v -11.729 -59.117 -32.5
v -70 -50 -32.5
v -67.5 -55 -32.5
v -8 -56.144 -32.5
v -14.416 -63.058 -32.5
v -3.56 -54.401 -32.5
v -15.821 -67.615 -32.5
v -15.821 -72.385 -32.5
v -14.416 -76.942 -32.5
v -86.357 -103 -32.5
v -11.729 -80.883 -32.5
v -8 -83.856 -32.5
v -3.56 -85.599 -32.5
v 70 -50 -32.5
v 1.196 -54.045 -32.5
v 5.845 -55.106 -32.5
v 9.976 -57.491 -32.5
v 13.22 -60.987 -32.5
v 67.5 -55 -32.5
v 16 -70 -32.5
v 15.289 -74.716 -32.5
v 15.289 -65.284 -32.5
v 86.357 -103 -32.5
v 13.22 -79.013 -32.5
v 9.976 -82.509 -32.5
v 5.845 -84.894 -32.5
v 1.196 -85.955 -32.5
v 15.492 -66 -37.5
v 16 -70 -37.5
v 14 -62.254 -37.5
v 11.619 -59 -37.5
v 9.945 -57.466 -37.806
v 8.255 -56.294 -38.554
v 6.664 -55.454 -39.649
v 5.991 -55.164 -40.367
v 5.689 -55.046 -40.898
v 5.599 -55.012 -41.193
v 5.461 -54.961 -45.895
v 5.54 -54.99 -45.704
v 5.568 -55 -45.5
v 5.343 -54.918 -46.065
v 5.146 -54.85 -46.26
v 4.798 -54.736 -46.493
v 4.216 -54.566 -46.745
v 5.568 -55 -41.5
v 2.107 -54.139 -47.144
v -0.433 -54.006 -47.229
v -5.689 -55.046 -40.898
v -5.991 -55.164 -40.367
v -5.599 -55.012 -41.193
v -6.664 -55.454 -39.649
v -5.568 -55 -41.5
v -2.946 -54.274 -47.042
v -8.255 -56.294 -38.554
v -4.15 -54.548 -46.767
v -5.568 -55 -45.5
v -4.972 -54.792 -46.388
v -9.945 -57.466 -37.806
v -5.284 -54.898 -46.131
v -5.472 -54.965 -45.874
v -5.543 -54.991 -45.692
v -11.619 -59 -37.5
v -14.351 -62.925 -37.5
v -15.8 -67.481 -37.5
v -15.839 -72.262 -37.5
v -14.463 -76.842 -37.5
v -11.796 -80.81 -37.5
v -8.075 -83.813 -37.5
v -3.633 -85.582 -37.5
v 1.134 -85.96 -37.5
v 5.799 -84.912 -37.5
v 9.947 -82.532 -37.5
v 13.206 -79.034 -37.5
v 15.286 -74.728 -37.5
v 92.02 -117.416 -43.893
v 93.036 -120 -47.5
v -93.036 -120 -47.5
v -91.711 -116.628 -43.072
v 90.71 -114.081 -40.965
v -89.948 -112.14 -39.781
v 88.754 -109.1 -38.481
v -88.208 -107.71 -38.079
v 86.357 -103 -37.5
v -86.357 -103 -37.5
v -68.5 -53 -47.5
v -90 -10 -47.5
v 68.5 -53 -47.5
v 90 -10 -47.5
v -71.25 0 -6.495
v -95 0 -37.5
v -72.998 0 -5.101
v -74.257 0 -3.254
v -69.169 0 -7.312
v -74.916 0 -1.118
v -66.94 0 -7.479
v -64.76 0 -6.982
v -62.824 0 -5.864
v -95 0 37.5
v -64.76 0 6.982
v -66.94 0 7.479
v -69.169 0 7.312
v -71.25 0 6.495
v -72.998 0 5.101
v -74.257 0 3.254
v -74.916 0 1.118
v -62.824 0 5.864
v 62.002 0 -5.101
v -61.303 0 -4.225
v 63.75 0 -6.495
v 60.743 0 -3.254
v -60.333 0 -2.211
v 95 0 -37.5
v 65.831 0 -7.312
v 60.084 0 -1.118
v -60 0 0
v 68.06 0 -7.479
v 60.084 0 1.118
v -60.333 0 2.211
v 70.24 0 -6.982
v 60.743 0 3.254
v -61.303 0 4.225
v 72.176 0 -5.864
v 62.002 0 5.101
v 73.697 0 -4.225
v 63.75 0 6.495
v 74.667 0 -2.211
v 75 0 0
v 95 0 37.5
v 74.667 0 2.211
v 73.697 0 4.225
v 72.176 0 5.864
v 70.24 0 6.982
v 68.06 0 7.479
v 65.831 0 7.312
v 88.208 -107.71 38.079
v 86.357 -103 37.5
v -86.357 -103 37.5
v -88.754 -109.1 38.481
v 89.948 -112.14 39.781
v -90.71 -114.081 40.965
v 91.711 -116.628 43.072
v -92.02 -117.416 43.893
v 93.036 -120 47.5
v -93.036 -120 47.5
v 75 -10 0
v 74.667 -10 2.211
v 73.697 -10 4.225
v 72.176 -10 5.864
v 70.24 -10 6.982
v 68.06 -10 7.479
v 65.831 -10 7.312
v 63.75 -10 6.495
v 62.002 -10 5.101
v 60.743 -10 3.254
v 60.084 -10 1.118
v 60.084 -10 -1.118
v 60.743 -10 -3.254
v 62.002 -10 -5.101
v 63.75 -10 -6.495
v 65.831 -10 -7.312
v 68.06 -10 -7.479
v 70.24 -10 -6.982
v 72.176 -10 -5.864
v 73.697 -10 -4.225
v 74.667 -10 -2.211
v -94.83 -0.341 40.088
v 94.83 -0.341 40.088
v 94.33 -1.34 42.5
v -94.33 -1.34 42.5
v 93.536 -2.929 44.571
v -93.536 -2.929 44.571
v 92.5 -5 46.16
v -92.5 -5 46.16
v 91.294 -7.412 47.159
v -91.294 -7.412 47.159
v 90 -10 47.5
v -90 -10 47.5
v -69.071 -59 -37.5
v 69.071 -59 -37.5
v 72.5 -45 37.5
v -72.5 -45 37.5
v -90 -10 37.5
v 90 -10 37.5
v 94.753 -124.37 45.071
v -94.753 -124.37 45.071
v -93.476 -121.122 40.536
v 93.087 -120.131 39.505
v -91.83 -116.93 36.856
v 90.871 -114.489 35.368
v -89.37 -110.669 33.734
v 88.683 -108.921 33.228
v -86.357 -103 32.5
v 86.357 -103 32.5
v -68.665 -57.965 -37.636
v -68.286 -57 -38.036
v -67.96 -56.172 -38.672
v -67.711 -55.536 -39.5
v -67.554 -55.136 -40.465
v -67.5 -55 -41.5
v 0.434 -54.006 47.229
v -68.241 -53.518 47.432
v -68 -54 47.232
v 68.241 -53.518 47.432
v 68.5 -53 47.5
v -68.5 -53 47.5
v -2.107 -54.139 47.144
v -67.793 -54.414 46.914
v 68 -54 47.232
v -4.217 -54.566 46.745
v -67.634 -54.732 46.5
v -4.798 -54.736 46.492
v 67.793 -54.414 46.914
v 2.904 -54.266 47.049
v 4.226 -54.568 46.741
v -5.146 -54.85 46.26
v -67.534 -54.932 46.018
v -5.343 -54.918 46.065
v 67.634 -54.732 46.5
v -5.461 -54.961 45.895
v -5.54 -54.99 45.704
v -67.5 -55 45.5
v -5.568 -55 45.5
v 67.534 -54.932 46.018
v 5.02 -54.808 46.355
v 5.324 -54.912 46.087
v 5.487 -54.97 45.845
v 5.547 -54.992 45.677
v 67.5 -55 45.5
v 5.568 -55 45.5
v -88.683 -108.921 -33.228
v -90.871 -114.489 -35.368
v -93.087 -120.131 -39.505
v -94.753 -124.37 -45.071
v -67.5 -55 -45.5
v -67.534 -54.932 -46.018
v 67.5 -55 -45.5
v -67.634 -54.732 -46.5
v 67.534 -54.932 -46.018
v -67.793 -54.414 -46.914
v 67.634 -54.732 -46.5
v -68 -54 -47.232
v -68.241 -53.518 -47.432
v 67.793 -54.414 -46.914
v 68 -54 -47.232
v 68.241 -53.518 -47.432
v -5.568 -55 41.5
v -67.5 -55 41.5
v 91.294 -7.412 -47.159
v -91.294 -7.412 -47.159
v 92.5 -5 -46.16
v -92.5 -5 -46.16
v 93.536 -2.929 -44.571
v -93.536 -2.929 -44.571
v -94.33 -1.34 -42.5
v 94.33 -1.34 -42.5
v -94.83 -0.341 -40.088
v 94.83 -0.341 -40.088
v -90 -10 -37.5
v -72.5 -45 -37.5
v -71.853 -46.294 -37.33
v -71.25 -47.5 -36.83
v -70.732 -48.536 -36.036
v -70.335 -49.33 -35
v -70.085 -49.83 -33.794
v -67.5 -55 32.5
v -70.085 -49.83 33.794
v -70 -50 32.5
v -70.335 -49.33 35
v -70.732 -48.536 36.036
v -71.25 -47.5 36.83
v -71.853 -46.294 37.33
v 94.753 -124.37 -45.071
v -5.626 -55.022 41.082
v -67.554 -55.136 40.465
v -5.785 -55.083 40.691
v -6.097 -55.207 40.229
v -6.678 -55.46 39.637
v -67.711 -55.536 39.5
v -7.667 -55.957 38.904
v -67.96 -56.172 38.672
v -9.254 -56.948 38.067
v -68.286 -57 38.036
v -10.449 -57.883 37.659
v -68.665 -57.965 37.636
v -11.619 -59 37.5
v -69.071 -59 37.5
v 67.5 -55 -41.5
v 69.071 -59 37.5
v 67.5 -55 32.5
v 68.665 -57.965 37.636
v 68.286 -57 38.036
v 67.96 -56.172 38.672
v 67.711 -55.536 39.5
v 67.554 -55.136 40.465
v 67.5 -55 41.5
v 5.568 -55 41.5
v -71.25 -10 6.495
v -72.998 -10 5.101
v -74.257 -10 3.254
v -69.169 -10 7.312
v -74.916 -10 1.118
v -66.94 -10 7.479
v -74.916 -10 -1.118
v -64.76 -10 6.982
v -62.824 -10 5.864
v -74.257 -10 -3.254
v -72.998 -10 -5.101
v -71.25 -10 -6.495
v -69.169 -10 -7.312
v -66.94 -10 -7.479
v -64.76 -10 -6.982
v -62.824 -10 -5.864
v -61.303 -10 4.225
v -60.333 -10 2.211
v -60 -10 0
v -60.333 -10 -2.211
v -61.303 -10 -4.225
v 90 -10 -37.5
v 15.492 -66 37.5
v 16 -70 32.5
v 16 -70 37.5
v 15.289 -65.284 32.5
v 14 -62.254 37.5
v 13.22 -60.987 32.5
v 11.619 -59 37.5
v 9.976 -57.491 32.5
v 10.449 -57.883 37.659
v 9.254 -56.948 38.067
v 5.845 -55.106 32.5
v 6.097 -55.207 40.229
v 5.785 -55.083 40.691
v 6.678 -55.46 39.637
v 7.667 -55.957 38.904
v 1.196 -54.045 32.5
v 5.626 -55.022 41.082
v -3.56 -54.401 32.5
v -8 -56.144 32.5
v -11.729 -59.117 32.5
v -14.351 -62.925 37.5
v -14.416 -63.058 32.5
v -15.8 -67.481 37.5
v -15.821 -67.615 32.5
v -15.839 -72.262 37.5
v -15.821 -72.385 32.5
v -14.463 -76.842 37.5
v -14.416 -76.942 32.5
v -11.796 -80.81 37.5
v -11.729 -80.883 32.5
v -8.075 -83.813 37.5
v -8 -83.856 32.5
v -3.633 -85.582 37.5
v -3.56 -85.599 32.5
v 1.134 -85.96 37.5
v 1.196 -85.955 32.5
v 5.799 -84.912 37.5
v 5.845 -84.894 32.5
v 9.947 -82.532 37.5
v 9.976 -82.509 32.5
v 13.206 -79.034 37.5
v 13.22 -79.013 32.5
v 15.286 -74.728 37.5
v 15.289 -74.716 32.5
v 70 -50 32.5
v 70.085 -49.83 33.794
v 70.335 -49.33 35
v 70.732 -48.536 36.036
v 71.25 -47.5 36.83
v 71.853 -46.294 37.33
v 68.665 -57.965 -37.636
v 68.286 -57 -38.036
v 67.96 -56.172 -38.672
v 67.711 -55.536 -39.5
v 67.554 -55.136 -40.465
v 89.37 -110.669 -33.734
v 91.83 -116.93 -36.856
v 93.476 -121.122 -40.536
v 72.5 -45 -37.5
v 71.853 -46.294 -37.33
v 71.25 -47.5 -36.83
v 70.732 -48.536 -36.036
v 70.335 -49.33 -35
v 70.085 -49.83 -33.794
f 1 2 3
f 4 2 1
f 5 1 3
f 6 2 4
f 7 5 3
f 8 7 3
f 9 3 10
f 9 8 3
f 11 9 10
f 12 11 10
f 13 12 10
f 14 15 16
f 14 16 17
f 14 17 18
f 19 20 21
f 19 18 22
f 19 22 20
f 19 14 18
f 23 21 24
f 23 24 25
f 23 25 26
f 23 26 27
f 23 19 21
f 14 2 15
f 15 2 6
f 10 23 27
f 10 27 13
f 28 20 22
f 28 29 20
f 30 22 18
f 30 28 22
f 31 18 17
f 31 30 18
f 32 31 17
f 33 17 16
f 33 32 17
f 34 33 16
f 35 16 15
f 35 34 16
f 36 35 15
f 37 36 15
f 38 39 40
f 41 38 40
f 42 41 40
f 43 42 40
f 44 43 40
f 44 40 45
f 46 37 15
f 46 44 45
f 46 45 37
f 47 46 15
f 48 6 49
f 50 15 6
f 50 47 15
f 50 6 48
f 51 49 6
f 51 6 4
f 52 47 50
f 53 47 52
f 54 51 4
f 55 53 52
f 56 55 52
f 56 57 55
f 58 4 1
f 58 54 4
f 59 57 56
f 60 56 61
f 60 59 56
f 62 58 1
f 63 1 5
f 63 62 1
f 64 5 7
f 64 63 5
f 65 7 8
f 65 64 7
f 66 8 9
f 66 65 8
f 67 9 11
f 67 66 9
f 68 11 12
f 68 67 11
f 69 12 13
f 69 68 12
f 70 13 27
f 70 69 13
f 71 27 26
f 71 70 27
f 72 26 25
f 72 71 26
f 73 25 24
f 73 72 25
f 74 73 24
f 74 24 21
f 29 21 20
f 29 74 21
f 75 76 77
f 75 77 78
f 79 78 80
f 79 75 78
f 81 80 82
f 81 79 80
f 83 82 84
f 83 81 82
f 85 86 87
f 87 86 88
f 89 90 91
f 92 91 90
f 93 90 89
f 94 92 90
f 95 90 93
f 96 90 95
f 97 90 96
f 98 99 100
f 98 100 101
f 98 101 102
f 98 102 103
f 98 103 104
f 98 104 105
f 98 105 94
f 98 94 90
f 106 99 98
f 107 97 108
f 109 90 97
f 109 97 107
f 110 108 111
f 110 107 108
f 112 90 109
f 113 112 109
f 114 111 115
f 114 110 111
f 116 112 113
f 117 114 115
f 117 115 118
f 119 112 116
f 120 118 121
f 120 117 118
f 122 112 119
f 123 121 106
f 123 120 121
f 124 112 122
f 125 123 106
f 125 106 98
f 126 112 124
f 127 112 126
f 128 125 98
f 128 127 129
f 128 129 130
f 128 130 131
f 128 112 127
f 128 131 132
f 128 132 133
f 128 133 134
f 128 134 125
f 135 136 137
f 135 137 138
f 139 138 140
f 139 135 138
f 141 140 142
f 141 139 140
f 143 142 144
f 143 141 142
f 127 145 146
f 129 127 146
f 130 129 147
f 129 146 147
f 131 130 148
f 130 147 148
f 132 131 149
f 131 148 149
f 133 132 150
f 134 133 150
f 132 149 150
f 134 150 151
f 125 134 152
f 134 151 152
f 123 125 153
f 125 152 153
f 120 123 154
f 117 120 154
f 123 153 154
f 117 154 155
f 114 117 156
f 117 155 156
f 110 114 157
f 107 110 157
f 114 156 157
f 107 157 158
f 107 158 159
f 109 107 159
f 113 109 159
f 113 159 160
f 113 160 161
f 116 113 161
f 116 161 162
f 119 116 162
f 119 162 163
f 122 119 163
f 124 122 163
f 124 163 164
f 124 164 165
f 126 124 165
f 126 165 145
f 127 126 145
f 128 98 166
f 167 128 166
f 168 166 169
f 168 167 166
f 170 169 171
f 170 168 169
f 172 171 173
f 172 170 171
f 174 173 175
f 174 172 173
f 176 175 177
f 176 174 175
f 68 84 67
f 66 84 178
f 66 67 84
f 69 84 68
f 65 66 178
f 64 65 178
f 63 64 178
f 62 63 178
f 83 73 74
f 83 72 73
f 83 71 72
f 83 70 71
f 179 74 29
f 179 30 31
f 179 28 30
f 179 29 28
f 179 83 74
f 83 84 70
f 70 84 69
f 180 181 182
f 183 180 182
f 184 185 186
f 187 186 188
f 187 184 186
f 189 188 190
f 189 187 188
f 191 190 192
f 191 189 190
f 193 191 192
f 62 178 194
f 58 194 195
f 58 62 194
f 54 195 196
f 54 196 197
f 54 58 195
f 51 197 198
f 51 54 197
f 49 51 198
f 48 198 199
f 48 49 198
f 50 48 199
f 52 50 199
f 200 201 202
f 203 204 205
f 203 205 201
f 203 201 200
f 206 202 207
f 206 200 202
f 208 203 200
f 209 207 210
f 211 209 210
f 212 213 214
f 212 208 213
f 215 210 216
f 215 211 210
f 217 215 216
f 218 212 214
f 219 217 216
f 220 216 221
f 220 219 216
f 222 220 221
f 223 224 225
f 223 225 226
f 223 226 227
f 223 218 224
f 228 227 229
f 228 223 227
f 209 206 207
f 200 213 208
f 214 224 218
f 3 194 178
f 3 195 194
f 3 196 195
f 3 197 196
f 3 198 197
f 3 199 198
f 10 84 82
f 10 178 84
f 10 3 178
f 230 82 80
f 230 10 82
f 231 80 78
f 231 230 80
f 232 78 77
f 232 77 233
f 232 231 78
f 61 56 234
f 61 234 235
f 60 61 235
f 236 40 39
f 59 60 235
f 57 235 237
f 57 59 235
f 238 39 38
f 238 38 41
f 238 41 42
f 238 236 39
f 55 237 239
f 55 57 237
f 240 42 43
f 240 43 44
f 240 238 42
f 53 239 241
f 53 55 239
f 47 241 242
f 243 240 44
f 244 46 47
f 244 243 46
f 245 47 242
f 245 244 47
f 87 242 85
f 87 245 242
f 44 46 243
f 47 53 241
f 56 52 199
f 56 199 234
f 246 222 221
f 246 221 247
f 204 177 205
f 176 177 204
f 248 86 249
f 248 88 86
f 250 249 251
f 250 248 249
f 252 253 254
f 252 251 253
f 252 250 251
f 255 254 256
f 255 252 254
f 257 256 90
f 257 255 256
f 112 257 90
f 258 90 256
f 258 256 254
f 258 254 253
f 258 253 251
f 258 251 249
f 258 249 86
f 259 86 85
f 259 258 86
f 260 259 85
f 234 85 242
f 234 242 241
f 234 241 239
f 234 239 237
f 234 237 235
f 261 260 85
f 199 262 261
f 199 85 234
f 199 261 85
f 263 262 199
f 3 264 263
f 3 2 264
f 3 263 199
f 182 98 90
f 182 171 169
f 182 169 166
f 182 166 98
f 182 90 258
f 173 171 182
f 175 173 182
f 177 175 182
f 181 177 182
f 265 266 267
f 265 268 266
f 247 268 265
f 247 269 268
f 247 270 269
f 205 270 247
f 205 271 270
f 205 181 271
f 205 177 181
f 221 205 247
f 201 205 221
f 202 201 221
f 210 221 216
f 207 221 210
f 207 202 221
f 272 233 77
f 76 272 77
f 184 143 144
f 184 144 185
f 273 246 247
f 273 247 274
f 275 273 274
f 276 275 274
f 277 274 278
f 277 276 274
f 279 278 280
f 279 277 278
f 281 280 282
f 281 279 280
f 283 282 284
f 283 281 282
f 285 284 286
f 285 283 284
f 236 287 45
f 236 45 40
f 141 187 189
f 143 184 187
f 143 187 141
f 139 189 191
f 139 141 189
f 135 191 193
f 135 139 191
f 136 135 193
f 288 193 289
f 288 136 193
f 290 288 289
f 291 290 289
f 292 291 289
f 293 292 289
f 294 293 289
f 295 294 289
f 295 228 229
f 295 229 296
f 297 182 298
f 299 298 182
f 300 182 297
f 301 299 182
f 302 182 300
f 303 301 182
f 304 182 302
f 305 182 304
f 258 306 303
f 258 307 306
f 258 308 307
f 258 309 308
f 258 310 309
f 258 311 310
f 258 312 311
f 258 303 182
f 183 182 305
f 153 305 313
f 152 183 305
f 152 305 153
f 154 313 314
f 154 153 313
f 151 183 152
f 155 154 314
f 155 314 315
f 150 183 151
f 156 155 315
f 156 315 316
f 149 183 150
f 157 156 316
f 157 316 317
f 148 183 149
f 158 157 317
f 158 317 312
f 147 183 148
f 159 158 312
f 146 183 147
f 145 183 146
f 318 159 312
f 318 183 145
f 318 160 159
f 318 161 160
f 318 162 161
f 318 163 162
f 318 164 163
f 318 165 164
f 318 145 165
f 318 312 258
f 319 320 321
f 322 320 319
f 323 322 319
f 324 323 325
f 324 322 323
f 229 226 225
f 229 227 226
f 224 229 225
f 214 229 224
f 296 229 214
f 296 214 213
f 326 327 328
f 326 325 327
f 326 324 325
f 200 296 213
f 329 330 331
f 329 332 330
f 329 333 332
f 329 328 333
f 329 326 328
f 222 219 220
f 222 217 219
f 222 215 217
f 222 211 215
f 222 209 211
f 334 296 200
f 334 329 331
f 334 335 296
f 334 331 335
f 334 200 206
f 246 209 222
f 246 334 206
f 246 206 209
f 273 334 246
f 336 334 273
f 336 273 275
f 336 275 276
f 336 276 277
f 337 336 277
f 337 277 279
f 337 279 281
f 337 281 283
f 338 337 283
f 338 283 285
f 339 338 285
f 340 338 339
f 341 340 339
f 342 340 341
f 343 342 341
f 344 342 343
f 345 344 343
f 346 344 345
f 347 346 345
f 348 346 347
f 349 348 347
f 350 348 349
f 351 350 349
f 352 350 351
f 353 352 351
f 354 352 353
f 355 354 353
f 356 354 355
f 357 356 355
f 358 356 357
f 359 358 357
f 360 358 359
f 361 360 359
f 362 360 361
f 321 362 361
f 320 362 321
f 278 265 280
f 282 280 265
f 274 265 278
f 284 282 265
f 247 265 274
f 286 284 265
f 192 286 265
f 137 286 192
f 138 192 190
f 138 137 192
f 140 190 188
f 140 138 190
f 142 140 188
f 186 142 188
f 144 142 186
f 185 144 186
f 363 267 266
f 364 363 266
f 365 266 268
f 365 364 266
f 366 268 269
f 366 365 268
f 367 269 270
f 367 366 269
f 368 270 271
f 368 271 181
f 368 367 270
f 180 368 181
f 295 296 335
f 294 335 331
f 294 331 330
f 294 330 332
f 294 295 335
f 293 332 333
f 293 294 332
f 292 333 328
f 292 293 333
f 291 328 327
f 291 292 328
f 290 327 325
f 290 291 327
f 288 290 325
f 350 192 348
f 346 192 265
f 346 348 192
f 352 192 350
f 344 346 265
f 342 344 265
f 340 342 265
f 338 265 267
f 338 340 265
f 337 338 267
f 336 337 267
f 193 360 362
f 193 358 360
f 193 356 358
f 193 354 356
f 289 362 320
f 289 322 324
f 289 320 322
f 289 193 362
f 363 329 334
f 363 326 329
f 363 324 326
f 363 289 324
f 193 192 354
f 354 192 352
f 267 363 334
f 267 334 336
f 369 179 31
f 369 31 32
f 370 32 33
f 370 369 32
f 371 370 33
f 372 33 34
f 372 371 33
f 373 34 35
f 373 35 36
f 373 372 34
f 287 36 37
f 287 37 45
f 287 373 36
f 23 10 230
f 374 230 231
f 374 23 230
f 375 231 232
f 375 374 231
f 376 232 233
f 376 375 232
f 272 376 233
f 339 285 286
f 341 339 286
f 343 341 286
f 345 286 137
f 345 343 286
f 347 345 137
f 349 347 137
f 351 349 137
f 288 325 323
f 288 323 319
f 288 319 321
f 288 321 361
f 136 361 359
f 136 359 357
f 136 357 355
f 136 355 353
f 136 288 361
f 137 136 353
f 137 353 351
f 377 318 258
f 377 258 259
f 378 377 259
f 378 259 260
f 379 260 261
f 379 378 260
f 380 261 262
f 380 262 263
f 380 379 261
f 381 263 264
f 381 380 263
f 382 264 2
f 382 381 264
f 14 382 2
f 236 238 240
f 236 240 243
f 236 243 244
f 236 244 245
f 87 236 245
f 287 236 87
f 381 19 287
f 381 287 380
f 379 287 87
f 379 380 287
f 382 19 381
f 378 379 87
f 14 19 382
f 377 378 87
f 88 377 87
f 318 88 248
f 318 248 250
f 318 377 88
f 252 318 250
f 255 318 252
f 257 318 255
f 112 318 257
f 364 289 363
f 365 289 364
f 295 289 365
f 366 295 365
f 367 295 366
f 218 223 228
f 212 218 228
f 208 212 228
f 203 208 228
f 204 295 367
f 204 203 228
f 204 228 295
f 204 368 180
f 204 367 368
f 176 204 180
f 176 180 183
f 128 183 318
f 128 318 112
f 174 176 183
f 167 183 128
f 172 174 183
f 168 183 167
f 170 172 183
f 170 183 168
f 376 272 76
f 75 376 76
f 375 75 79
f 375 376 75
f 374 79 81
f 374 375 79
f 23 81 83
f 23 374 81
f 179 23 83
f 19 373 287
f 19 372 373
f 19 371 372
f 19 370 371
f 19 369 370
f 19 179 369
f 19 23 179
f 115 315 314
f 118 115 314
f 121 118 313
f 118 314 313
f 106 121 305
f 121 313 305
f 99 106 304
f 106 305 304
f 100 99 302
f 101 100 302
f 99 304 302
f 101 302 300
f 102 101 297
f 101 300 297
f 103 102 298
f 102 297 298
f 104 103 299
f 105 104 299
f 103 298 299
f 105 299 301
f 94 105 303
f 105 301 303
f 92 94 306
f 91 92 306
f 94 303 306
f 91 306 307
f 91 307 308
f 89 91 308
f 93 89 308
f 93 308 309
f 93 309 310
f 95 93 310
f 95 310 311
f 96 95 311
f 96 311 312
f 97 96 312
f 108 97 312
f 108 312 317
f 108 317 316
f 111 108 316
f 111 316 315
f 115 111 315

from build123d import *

# Parameters (mm, degrees)
F0_R     = 16
F1_DEPTH = 47.5
F3_DEPTH = 95
F5_D     = 15


# Not quite as in the source:
# - ends of sketch curves that miss each other by under 0.0002 mm in the source are joined


with BuildPart() as f1:
    # F0 (on Top) → F1 (new body, symmetric)
    with BuildSketch(Plane.XY):
        Polygon((95, 0), (0, 0), (-95, 0), (-67.5, -55), (-95, -125), (0, -125), (95, -125), (67.5, -55), align=None)
        with Locations((0, -70)):
            Circle(F0_R, mode=Mode.SUBTRACT)
    extrude(amount=F1_DEPTH, both=True)

    # F2 (on Right) → F3 (intersect, symmetric)
    with BuildSketch(Plane.YZ):
        with BuildLine():
            Line((-10, 0), (0, 0))
            Line((0, 0), (0, 37.5))
            ThreePointArc((0, 37.5), (-2.9289321881, 44.5710678119), (-10, 47.5))
            Line((-10, 47.5), (-53, 47.5))
            ThreePointArc((-53, 47.5), (-54.4142135624, 46.9142135624), (-55, 45.5))
            Line((-55, 45.5), (-55, 41.5))
            ThreePointArc((-55, 41.5), (-56.1715728753, 38.6715728753), (-59, 37.5))
            Line((-59, 37.5), (-103, 37.5))
            ThreePointArc((-103, 37.5), (-112.8615414617, 40.1853795152), (-120, 47.5))
            Line((-120, 47.5), (-124.3701794471, 45.0706943661))
            ThreePointArc((-124.3701794471, 45.0706943661), (-115.3966418036, 35.8757089339), (-103, 32.5000005737))
            Line((-103, 32.5000005737), (-50, 32.5000005737))
            ThreePointArc((-50, 32.5000005737), (-48.5355339059, 36.0355339059), (-45, 37.5))
            Line((-45, 37.5), (-10, 37.5))
            Line((-10, 37.5), (-10, 0))
        make_face()
        with BuildLine():
            Line((0, -37.5), (0, 0))
            Line((0, 0), (-10, 0))
            Line((-10, 0), (-10, -37.5))
            Line((-10, -37.5), (-45, -37.5))
            ThreePointArc((-45, -37.5), (-48.5355339059, -36.0355339059), (-50, -32.5))
            Line((-50, -32.5), (-103, -32.5000005737))
            ThreePointArc((-103, -32.5000005737), (-115.3966418036, -35.8757089339), (-124.3701794471, -45.0706943661))
            Line((-124.3701794471, -45.0706943661), (-120, -47.5))
            ThreePointArc((-120, -47.5), (-112.8615414617, -40.1853795152), (-103, -37.5))
            Line((-103, -37.5), (-59, -37.5))
            ThreePointArc((-59, -37.5), (-56.1715728753, -38.6715728753), (-55, -41.5))
            Line((-55, -41.5), (-55, -45.5))
            ThreePointArc((-55, -45.5), (-54.4142135624, -46.9142135624), (-53, -47.5))
            Line((-53, -47.5), (-10, -47.5))
            ThreePointArc((-10, -47.5), (-2.9289321881, -44.5710678119), (0, -37.5))
        make_face()
    extrude(amount=F3_DEPTH, both=True, mode=Mode.INTERSECT)

    # F5 (through all)
    with Locations(Plane(origin=(0, 0, 0), x_dir=(-1, 0, 0), z_dir=(0, 1, 0))):
        with Locations((67.5, 0), (-67.5, 0)):
            Hole(F5_D / 2)


solid = f1.part
